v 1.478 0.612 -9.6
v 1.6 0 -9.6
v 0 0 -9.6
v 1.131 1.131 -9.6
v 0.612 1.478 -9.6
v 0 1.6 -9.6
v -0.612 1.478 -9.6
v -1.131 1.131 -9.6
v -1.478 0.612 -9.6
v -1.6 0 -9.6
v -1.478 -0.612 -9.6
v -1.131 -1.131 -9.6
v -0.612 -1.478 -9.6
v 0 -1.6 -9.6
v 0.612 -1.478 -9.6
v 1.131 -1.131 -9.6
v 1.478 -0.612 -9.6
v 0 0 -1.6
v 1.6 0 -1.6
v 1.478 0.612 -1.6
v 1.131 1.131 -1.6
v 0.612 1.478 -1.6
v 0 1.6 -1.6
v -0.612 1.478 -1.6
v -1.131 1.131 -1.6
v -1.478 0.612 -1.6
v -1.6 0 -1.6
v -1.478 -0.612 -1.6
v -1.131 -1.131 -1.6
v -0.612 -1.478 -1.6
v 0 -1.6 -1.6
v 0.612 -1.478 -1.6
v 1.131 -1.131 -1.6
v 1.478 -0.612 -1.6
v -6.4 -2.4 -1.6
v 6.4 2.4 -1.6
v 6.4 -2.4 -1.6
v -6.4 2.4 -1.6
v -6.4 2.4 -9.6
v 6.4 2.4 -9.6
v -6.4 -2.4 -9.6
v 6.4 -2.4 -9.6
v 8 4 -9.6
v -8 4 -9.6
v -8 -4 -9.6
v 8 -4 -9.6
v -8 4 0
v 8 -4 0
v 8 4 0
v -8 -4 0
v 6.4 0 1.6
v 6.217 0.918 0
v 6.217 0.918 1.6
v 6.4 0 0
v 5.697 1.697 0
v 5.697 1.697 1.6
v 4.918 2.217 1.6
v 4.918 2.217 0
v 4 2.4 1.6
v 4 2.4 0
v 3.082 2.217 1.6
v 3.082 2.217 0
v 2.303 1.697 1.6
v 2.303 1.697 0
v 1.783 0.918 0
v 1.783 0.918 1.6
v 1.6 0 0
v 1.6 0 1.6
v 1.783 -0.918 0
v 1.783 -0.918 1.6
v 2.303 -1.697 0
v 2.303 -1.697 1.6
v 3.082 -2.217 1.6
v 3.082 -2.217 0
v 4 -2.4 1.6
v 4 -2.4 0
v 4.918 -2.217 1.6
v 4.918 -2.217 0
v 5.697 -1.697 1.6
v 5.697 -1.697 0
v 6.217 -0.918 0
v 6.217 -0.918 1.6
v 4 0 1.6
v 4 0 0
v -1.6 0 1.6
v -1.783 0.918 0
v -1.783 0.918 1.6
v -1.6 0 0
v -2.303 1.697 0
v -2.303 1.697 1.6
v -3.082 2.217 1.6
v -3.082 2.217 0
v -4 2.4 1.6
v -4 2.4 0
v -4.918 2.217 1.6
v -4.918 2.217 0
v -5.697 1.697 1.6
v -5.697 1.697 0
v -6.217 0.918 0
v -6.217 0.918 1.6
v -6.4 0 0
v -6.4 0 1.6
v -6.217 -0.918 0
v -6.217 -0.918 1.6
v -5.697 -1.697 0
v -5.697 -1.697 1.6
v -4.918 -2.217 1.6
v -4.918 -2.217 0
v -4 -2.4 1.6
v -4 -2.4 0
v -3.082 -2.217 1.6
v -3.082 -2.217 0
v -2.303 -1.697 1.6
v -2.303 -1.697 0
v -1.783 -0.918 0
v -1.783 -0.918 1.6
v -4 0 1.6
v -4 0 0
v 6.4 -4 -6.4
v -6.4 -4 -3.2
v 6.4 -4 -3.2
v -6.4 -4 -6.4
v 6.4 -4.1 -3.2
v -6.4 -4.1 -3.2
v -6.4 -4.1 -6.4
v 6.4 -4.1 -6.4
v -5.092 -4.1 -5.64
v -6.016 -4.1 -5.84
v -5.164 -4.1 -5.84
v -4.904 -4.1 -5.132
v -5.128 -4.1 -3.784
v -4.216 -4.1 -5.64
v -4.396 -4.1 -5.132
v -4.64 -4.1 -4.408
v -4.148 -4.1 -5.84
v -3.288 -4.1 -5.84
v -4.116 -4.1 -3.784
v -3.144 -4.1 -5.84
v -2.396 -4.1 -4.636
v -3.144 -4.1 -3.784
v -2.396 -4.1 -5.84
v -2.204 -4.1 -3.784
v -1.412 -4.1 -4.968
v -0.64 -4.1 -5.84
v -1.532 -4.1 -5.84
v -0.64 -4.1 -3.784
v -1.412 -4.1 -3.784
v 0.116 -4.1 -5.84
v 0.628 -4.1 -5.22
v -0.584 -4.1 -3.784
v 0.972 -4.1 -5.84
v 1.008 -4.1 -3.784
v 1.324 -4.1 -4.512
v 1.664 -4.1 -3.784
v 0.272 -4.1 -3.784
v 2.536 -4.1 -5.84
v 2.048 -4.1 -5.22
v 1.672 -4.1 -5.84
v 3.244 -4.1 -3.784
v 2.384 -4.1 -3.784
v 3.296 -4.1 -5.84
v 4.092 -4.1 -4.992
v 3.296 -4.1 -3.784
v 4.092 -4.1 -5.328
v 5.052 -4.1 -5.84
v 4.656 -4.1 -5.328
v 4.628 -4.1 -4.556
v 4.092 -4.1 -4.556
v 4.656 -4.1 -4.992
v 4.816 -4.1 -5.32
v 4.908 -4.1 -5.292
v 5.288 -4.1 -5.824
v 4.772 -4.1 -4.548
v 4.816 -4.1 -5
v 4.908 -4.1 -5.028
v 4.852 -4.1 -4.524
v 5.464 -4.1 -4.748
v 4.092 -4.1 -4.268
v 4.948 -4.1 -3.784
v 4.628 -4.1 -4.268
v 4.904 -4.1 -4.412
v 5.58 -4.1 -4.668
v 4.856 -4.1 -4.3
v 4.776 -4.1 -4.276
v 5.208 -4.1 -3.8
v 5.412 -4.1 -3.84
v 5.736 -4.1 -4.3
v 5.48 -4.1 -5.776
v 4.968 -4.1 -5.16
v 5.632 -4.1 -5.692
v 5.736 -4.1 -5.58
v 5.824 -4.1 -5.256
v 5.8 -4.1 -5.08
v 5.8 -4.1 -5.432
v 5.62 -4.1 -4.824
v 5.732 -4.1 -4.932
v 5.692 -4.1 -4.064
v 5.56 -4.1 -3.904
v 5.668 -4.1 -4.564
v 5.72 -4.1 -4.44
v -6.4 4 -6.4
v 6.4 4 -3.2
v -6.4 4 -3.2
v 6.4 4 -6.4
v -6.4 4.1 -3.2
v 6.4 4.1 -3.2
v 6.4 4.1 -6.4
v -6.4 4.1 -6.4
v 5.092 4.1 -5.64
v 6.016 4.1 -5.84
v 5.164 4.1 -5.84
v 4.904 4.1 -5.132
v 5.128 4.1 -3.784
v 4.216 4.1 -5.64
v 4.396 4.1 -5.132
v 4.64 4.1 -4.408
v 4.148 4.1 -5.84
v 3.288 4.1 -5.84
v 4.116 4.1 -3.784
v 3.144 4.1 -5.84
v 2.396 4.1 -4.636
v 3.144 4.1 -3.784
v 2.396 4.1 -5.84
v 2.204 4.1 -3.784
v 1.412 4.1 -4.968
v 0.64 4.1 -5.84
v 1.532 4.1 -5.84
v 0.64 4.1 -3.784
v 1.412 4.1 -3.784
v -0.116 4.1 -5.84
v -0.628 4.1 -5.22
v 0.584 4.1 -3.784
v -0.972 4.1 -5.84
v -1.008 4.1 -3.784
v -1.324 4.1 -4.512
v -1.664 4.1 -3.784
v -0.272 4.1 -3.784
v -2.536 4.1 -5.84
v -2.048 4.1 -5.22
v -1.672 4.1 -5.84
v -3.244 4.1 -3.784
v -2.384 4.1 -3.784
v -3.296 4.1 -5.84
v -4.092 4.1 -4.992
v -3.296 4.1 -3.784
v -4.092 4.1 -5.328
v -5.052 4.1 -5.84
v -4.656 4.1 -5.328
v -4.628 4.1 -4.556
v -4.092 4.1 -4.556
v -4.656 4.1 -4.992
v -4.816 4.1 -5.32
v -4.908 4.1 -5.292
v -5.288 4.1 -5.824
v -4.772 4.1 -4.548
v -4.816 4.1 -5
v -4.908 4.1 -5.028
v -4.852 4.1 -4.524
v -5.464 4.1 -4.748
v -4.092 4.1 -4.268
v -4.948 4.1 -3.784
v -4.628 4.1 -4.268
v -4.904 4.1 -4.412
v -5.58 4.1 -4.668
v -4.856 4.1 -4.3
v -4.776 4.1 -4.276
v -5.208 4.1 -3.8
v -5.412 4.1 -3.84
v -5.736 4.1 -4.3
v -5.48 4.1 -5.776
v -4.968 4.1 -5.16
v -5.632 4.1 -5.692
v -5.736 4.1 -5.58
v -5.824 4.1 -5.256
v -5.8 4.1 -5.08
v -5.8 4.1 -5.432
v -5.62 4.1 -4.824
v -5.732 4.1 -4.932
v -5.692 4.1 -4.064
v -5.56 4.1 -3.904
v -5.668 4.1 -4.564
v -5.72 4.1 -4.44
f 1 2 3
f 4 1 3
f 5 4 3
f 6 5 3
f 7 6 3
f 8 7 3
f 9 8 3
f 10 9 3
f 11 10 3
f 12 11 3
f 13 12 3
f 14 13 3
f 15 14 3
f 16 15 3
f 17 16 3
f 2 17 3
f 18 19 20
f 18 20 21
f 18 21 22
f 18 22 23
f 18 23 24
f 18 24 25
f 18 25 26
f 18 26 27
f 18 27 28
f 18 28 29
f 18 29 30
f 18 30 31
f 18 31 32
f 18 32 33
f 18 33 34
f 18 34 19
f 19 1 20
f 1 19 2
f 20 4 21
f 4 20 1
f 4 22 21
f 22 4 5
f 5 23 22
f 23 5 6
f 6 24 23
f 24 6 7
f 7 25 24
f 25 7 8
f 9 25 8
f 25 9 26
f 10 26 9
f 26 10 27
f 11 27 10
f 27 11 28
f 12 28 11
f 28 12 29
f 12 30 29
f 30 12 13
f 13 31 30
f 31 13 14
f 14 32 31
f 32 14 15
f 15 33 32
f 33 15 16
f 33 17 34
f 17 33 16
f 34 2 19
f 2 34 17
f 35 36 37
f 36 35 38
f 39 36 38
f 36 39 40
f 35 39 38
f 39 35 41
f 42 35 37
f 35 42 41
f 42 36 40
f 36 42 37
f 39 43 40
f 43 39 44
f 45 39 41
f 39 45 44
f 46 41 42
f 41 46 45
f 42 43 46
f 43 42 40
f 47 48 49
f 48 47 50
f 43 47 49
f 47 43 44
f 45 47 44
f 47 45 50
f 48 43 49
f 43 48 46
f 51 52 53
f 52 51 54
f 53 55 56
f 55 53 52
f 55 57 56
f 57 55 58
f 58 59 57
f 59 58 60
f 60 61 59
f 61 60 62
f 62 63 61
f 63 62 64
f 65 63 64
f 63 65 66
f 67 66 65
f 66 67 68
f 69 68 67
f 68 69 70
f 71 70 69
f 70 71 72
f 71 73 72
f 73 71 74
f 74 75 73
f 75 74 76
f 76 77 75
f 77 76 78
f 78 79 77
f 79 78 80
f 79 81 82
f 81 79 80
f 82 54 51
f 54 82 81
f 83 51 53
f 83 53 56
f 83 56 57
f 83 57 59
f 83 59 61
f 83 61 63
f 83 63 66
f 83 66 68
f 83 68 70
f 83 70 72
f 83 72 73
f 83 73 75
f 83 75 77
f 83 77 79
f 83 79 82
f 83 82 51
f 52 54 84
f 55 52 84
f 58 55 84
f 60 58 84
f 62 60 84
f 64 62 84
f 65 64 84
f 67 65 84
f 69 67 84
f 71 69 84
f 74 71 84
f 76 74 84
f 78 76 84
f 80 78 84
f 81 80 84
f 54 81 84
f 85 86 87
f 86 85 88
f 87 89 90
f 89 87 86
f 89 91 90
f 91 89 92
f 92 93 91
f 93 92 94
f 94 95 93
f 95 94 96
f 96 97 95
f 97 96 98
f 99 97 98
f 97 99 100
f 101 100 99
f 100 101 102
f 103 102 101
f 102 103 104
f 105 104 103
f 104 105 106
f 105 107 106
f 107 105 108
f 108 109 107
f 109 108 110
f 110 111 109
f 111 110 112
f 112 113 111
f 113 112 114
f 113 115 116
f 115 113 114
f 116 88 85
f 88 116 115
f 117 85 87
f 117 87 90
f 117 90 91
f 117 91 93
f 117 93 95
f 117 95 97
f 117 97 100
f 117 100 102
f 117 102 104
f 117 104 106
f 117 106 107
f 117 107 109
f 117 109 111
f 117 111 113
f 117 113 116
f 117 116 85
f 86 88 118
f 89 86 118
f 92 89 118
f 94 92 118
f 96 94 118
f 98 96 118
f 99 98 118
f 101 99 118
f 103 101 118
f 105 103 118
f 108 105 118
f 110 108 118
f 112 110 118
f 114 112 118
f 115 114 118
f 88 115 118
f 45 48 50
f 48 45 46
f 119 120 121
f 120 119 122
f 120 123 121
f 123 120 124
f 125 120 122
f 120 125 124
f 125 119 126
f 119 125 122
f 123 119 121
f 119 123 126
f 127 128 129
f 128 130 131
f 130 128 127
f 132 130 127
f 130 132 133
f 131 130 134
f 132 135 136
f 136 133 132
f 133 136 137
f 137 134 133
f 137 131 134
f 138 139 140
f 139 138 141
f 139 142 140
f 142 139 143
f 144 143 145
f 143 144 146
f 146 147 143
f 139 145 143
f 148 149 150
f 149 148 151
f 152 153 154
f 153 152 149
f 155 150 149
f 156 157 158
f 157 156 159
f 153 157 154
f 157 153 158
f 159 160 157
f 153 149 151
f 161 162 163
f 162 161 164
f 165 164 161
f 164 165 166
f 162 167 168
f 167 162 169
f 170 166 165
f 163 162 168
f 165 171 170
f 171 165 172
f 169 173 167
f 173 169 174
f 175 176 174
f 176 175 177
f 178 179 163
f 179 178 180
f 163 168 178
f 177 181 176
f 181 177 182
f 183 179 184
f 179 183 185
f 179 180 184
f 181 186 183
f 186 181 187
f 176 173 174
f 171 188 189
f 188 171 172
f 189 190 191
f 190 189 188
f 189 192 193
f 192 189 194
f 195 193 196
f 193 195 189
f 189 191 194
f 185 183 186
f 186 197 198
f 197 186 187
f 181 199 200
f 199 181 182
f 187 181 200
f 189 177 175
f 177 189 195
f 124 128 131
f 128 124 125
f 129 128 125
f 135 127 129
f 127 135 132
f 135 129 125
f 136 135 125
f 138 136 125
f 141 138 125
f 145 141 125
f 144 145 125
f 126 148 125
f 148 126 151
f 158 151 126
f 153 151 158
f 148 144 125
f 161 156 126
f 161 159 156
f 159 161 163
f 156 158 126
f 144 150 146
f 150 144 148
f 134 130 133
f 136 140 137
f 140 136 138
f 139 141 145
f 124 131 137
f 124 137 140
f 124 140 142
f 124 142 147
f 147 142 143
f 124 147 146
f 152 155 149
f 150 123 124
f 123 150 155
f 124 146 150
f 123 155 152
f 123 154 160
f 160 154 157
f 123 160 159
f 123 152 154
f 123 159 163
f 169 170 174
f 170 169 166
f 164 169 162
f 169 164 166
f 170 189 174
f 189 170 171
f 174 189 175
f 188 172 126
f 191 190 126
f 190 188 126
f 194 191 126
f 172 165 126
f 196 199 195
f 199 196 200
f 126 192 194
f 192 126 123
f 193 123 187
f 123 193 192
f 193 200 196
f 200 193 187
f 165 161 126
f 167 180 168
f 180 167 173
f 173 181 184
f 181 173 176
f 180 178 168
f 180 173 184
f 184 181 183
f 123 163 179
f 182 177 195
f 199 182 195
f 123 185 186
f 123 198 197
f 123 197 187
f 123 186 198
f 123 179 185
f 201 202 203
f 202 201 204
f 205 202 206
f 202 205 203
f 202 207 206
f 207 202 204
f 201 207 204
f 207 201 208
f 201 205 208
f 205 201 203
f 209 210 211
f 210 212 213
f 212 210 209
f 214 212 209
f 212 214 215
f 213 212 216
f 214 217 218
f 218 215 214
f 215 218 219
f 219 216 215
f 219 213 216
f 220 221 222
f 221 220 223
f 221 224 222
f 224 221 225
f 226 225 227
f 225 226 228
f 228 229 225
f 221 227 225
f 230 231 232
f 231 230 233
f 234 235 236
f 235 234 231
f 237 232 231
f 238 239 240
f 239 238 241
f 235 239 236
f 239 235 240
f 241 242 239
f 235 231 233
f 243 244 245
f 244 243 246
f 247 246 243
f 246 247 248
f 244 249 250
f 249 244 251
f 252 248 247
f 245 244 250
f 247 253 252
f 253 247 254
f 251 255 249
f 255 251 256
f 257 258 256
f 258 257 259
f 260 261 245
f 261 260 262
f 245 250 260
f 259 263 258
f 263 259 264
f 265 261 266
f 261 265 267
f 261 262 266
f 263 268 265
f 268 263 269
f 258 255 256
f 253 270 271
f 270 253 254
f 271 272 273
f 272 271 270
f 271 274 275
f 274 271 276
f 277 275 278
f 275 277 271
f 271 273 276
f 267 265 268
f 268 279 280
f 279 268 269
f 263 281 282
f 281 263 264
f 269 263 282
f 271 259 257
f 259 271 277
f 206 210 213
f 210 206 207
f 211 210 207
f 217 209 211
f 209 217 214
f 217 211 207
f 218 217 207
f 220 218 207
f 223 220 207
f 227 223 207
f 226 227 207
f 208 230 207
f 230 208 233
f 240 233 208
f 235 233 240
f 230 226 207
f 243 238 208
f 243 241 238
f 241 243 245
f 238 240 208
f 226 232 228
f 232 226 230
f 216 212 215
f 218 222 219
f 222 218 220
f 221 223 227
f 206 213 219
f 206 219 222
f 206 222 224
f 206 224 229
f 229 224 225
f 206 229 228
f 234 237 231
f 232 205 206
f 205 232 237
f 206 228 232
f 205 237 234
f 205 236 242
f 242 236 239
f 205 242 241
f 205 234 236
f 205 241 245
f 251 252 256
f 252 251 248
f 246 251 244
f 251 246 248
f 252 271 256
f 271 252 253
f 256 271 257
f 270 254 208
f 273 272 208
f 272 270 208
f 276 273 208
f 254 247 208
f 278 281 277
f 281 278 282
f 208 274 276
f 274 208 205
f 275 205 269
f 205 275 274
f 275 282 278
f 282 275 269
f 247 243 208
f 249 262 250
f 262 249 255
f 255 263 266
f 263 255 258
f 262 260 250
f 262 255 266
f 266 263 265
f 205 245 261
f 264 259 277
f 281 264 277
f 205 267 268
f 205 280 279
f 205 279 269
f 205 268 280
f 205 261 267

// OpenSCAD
// file: ../p/4-4edge.scad
use <../lib.scad>
function ldraw_lib__4_4edge() = [
// 0 Circle 1.0
// 0 Name: 4-4edge.dat
// 0 Author: James Jessiman
// 0 !LDRAW_ORG Primitive UPDATE 2017-01
// 0 !LICENSE Licensed under CC BY 2.0 and CC BY 4.0 : see CAreadme.txt
// 
// 0 BFC CERTIFY CCW
  [0,"BFC","CERTIFY"],
  [0,"BFC","CCW"],
// 
// 0 !HISTORY 1998-12-15 [PTadmin] Official Update 1998-10
// 0 !HISTORY 2005-12-28 [PTadmin] Official Update 2005-01
// 0 !HISTORY 2007-06-24 [PTadmin] Header formatted for Contributor Agreement
// 0 !HISTORY 2008-07-01 [PTadmin] Official Update 2008-01
// 0 !HISTORY 2017-01-15 [Steffen] BFCed
// 0 !HISTORY 2017-12-30 [PTadmin] Official Update 2017-01
// 
// 
// 2 24 1 0 0 0.9239 0 0.3827
  [2,24,1,0,0,0.9239,0,0.3827],
// 2 24 0.9239 0 0.3827 0.7071 0 0.7071
  [2,24,0.9239,0,0.3827,0.7071,0,0.7071],
// 2 24 0.7071 0 0.7071 0.3827 0 0.9239
  [2,24,0.7071,0,0.7071,0.3827,0,0.9239],
// 2 24 0.3827 0 0.9239 0 0 1
  [2,24,0.3827,0,0.9239,0,0,1],
// 2 24 0 0 1 -0.3827 0 0.9239
  [2,24,0,0,1,-0.3827,0,0.9239],
// 2 24 -0.3827 0 0.9239 -0.7071 0 0.7071
  [2,24,-0.3827,0,0.9239,-0.7071,0,0.7071],
// 2 24 -0.7071 0 0.7071 -0.9239 0 0.3827
  [2,24,-0.7071,0,0.7071,-0.9239,0,0.3827],
// 2 24 -0.9239 0 0.3827 -1 0 -0
  [2,24,-0.9239,0,0.3827,-1,0,-0],
// 2 24 -1 0 -0 -0.9239 0 -0.3827
  [2,24,-1,0,-0,-0.9239,0,-0.3827],
// 2 24 -0.9239 0 -0.3827 -0.7071 0 -0.7071
  [2,24,-0.9239,0,-0.3827,-0.7071,0,-0.7071],
// 2 24 -0.7071 0 -0.7071 -0.3827 0 -0.9239
  [2,24,-0.7071,0,-0.7071,-0.3827,0,-0.9239],
// 2 24 -0.3827 0 -0.9239 0 0 -1
  [2,24,-0.3827,0,-0.9239,0,0,-1],
// 2 24 0 0 -1 0.3827 0 -0.9239
  [2,24,0,0,-1,0.3827,0,-0.9239],
// 2 24 0.3827 0 -0.9239 0.7071 0 -0.7071
  [2,24,0.3827,0,-0.9239,0.7071,0,-0.7071],
// 2 24 0.7071 0 -0.7071 0.9239 0 -0.3827
  [2,24,0.7071,0,-0.7071,0.9239,0,-0.3827],
// 2 24 0.9239 0 -0.3827 1 0 0
  [2,24,0.9239,0,-0.3827,1,0,0],
];
module ldraw_lib__4_4edge(step=0, col=false, unit=2/5, alt=false, line=0.2, solid=!$preview)
    makepoly(ldraw_lib__4_4edge(), step=step, col=col, unit=unit, alt=alt, line=line, solid=solid);
ldraw_lib__4_4edge(line=0.2);
// file: ../p/4-4disc.scad
use <../lib.scad>
function ldraw_lib__4_4disc() = [
// 0 Disc 1.0
// 0 Name: 4-4disc.dat
// 0 Author: James Jessiman
// 0 !LDRAW_ORG Primitive UPDATE 2002-02
// 0 !LICENSE Licensed under CC BY 2.0 and CC BY 4.0 : see CAreadme.txt
// 
// 0 BFC CERTIFY CCW
  [0,"BFC","CERTIFY"],
  [0,"BFC","CCW"],
// 
// 0 !HISTORY 1998-12-15 [PTadmin] Official Update 1998-10
// 0 !HISTORY 2002-03-23 [sbliss] Added BFC statement
// 0 !HISTORY 2002-04-25 [PTadmin] Official Update 2002-02
// 0 !HISTORY 2007-06-24 [PTadmin] Header formatted for Contributor Agreement
// 0 !HISTORY 2008-07-01 [PTadmin] Official Update 2008-01
// 
// 
// 3 16 0 0 0 1 0 0 0.9239 0 0.3827
  [3,16,0,0,0,1,0,0,0.9239,0,0.3827],
// 3 16 0 0 0 0.9239 0 0.3827 0.7071 0 0.7071
  [3,16,0,0,0,0.9239,0,0.3827,0.7071,0,0.7071],
// 3 16 0 0 0 0.7071 0 0.7071 0.3827 0 0.9239
  [3,16,0,0,0,0.7071,0,0.7071,0.3827,0,0.9239],
// 3 16 0 0 0 0.3827 0 0.9239 0 0 1
  [3,16,0,0,0,0.3827,0,0.9239,0,0,1],
// 3 16 0 0 0 0 0 1 -0.3827 0 0.9239
  [3,16,0,0,0,0,0,1,-0.3827,0,0.9239],
// 3 16 0 0 0 -0.3827 0 0.9239 -0.7071 0 0.7071
  [3,16,0,0,0,-0.3827,0,0.9239,-0.7071,0,0.7071],
// 3 16 0 0 0 -0.7071 0 0.7071 -0.9239 0 0.3827
  [3,16,0,0,0,-0.7071,0,0.7071,-0.9239,0,0.3827],
// 3 16 0 0 0 -0.9239 0 0.3827 -1 0 -0
  [3,16,0,0,0,-0.9239,0,0.3827,-1,0,-0],
// 3 16 0 0 0 -1 0 -0 -0.9239 0 -0.3827
  [3,16,0,0,0,-1,0,-0,-0.9239,0,-0.3827],
// 3 16 0 0 0 -0.9239 0 -0.3827 -0.7071 0 -0.7071
  [3,16,0,0,0,-0.9239,0,-0.3827,-0.7071,0,-0.7071],
// 3 16 0 0 0 -0.7071 0 -0.7071 -0.3827 0 -0.9239
  [3,16,0,0,0,-0.7071,0,-0.7071,-0.3827,0,-0.9239],
// 3 16 0 0 0 -0.3827 0 -0.9239 0 0 -1
  [3,16,0,0,0,-0.3827,0,-0.9239,0,0,-1],
// 3 16 0 0 0 0 0 -1 0.3827 0 -0.9239
  [3,16,0,0,0,0,0,-1,0.3827,0,-0.9239],
// 3 16 0 0 0 0.3827 0 -0.9239 0.7071 0 -0.7071
  [3,16,0,0,0,0.3827,0,-0.9239,0.7071,0,-0.7071],
// 3 16 0 0 0 0.7071 0 -0.7071 0.9239 0 -0.3827
  [3,16,0,0,0,0.7071,0,-0.7071,0.9239,0,-0.3827],
// 3 16 0 0 0 0.9239 0 -0.3827 1 0 0
  [3,16,0,0,0,0.9239,0,-0.3827,1,0,0],
// 0
];
module ldraw_lib__4_4disc(step=0, col=false, unit=2/5, alt=false, line=0.2, solid=!$preview)
    makepoly(ldraw_lib__4_4disc(), step=step, col=col, unit=unit, alt=alt, line=line, solid=solid);
ldraw_lib__4_4disc(line=0.2);
// file: ../p/4-4cyli.scad
use <../lib.scad>
$fa=1; $fs=0.2;
function ldraw_lib__4_4cyli(realsolid=false) = [
// 0 Cylinder 1.0
// 0 Name: 4-4cyli.dat
// 0 Author: James Jessiman
// 0 !LDRAW_ORG Primitive UPDATE 2005-01
// 0 !LICENSE Licensed under CC BY 2.0 and CC BY 4.0 : see CAreadme.txt
// 
// 0 BFC CERTIFY CCW
  [0,"BFC","CERTIFY"],
  [0,"BFC","CCW"],
// 
// 0 !HISTORY 1998-12-15 [PTadmin] Official Update 1998-10
// 0 !HISTORY 2002-03-23 [sbliss] Added BFC statement; merged headers from files in distributions LDraw 0.27 and Complete.
// 0 !HISTORY 2002-04-25 [PTadmin] Official Update 2002-02
// 0 !HISTORY 2004-12-14 [guyvivan] BFC CCW
// 0 !HISTORY 2005-12-28 [PTadmin] Official Update 2005-01
// 0 !HISTORY 2007-06-24 [PTadmin] Header formatted for Contributor Agreement
// 0 !HISTORY 2008-07-01 [PTadmin] Official Update 2008-01
// 
// 
// 4 16 1 1 0 0.9239 1 0.3827 0.9239 0 0.3827 1 0 0
  [4,16,1,1,0,0.9239,1,0.3827,0.9239,0,0.3827,1,0,0],
// 5 24 1 0 0 1 1 0 0.9239 0 0.3827 0.9239 0 -0.3827
  [5,24,1,0,0,1,1,0,0.9239,0,0.3827,0.9239,0,-0.3827],
// 4 16 0.9239 1 0.3827 0.7071 1 0.7071 0.7071 0 0.7071 0.9239 0 0.3827
  [4,16,0.9239,1,0.3827,0.7071,1,0.7071,0.7071,0,0.7071,0.9239,0,0.3827],
// 5 24 0.9239 0 0.3827 0.9239 1 0.3827 0.7071 0 0.7071 1 0 0
  [5,24,0.9239,0,0.3827,0.9239,1,0.3827,0.7071,0,0.7071,1,0,0],
// 4 16 0.7071 1 0.7071 0.3827 1 0.9239 0.3827 0 0.9239 0.7071 0 0.7071
  [4,16,0.7071,1,0.7071,0.3827,1,0.9239,0.3827,0,0.9239,0.7071,0,0.7071],
// 5 24 0.7071 0 0.7071 0.7071 1 0.7071 0.3827 0 0.9239 0.9239 0 0.3827
  [5,24,0.7071,0,0.7071,0.7071,1,0.7071,0.3827,0,0.9239,0.9239,0,0.3827],
// 4 16 0.3827 1 0.9239 0 1 1 0 0 1 0.3827 0 0.9239
  [4,16,0.3827,1,0.9239,0,1,1,0,0,1,0.3827,0,0.9239],
// 5 24 0.3827 0 0.9239 0.3827 1 0.9239 0 0 1 0.7071 0 0.7071
  [5,24,0.3827,0,0.9239,0.3827,1,0.9239,0,0,1,0.7071,0,0.7071],
// 4 16 0 1 1 -0.3827 1 0.9239 -0.3827 0 0.9239 0 0 1
  [4,16,0,1,1,-0.3827,1,0.9239,-0.3827,0,0.9239,0,0,1],
// 5 24 0 0 1 0 1 1 -0.3827 0 0.9239 0.3827 0 0.9239
  [5,24,0,0,1,0,1,1,-0.3827,0,0.9239,0.3827,0,0.9239],
// 4 16 -0.3827 1 0.9239 -0.7071 1 0.7071 -0.7071 0 0.7071 -0.3827 0 0.9239
  [4,16,-0.3827,1,0.9239,-0.7071,1,0.7071,-0.7071,0,0.7071,-0.3827,0,0.9239],
// 5 24 -0.3827 0 0.9239 -0.3827 1 0.9239 -0.7071 0 0.7071 0 0 1
  [5,24,-0.3827,0,0.9239,-0.3827,1,0.9239,-0.7071,0,0.7071,0,0,1],
// 4 16 -0.7071 1 0.7071 -0.9239 1 0.3827 -0.9239 0 0.3827 -0.7071 0 0.7071
  [4,16,-0.7071,1,0.7071,-0.9239,1,0.3827,-0.9239,0,0.3827,-0.7071,0,0.7071],
// 5 24 -0.7071 0 0.7071 -0.7071 1 0.7071 -0.9239 0 0.3827 -0.3827 0 0.9239
  [5,24,-0.7071,0,0.7071,-0.7071,1,0.7071,-0.9239,0,0.3827,-0.3827,0,0.9239],
// 4 16 -0.9239 1 0.3827 -1 1 0 -1 0 0 -0.9239 0 0.3827
  [4,16,-0.9239,1,0.3827,-1,1,0,-1,0,0,-0.9239,0,0.3827],
// 5 24 -0.9239 0 0.3827 -0.9239 1 0.3827 -1 0 0 -0.7071 0 0.7071
  [5,24,-0.9239,0,0.3827,-0.9239,1,0.3827,-1,0,0,-0.7071,0,0.7071],
// 4 16 -1 1 0 -0.9239 1 -0.3827 -0.9239 0 -0.3827 -1 0 0
  [4,16,-1,1,0,-0.9239,1,-0.3827,-0.9239,0,-0.3827,-1,0,0],
// 5 24 -1 0 0 -1 1 0 -0.9239 0 -0.3827 -0.9239 0 0.3827
  [5,24,-1,0,0,-1,1,0,-0.9239,0,-0.3827,-0.9239,0,0.3827],
// 4 16 -0.9239 1 -0.3827 -0.7071 1 -0.7071 -0.7071 0 -0.7071 -0.9239 0 -0.3827
  [4,16,-0.9239,1,-0.3827,-0.7071,1,-0.7071,-0.7071,0,-0.7071,-0.9239,0,-0.3827],
// 5 24 -0.9239 0 -0.3827 -0.9239 1 -0.3827 -0.7071 0 -0.7071 -1 0 0
  [5,24,-0.9239,0,-0.3827,-0.9239,1,-0.3827,-0.7071,0,-0.7071,-1,0,0],
// 4 16 -0.7071 1 -0.7071 -0.3827 1 -0.9239 -0.3827 0 -0.9239 -0.7071 0 -0.7071
  [4,16,-0.7071,1,-0.7071,-0.3827,1,-0.9239,-0.3827,0,-0.9239,-0.7071,0,-0.7071],
// 5 24 -0.7071 0 -0.7071 -0.7071 1 -0.7071 -0.3827 0 -0.9239 -0.9239 0 -0.3827
  [5,24,-0.7071,0,-0.7071,-0.7071,1,-0.7071,-0.3827,0,-0.9239,-0.9239,0,-0.3827],
// 4 16 -0.3827 1 -0.9239 0 1 -1 0 0 -1 -0.3827 0 -0.9239
  [4,16,-0.3827,1,-0.9239,0,1,-1,0,0,-1,-0.3827,0,-0.9239],
// 5 24 -0.3827 0 -0.9239 -0.3827 1 -0.9239 0 0 -1 -0.7071 0 -0.7071
  [5,24,-0.3827,0,-0.9239,-0.3827,1,-0.9239,0,0,-1,-0.7071,0,-0.7071],
// 4 16 0 1 -1 0.3827 1 -0.9239 0.3827 0 -0.9239 0 0 -1
  [4,16,0,1,-1,0.3827,1,-0.9239,0.3827,0,-0.9239,0,0,-1],
// 5 24 0 0 -1 0 1 -1 0.3827 0 -0.9239 -0.3827 0 -0.9239
  [5,24,0,0,-1,0,1,-1,0.3827,0,-0.9239,-0.3827,0,-0.9239],
// 4 16 0.3827 1 -0.9239 0.7071 1 -0.7071 0.7071 0 -0.7071 0.3827 0 -0.9239
  [4,16,0.3827,1,-0.9239,0.7071,1,-0.7071,0.7071,0,-0.7071,0.3827,0,-0.9239],
// 5 24 0.3827 0 -0.9239 0.3827 1 -0.9239 0.7071 0 -0.7071 0 0 -1
  [5,24,0.3827,0,-0.9239,0.3827,1,-0.9239,0.7071,0,-0.7071,0,0,-1],
// 4 16 0.7071 1 -0.7071 0.9239 1 -0.3827 0.9239 0 -0.3827 0.7071 0 -0.7071
  [4,16,0.7071,1,-0.7071,0.9239,1,-0.3827,0.9239,0,-0.3827,0.7071,0,-0.7071],
// 5 24 0.7071 0 -0.7071 0.7071 1 -0.7071 0.9239 0 -0.3827 0.3827 0 -0.9239
  [5,24,0.7071,0,-0.7071,0.7071,1,-0.7071,0.9239,0,-0.3827,0.3827,0,-0.9239],
// 4 16 0.9239 1 -0.3827 1 1 0 1 0 0 0.9239 0 -0.3827
  [4,16,0.9239,1,-0.3827,1,1,0,1,0,0,0.9239,0,-0.3827],
// 5 24 0.9239 0 -0.3827 0.9239 1 -0.3827 1 0 0 0.7071 0 -0.7071
  [5,24,0.9239,0,-0.3827,0.9239,1,-0.3827,1,0,0,0.7071,0,-0.7071],
// 0
];
module ldraw_lib__4_4cyli(step=0, col=false, unit=2/5, alt=false, line=0.2, solid=!$preview)
    makepoly(ldraw_lib__4_4cyli(solid), step=step, col=col, unit=unit, alt=alt, line=line, solid=solid);
ldraw_lib__4_4cyli(line=0.2);
// file: ../p/stud3.scad
use <../lib.scad>
use <4-4cyli.scad>
use <4-4disc.scad>
use <4-4edge.scad>
function ldraw_lib__stud3() = [
// 0 Stud Tube Solid
// 0 Name: stud3.dat
// 0 Author: James Jessiman
// 0 !LDRAW_ORG Primitive UPDATE 2012-01
// 0 !LICENSE Licensed under CC BY 4.0 : see CAreadme.txt
// 
// 0 BFC CERTIFY CCW
  [0,"BFC","CERTIFY"],
  [0,"BFC","CCW"],
// 
// 0 !HISTORY 2002-04-04 [sbliss] Modified for BFC compliance
// 0 !HISTORY 2002-04-25 [PTadmin] Official Update 2002-02
// 0 !HISTORY 2007-06-24 [PTadmin] Header formatted for Contributor Agreement
// 0 !HISTORY 2008-07-01 [PTadmin] Official Update 2008-01
// 0 !HISTORY 2012-02-16 [Philo] Changed to CCW
// 0 !HISTORY 2012-03-30 [PTadmin] Official Update 2012-01
// 
// 
// 1 16 0 -4 0 4 0 0 0 1 0 0 0 4 4-4edge.dat
  [1,16,0,-4,0,4,0,0,0,1,0,0,0,4, ldraw_lib__4_4edge()],
// 1 16 0 0 0 4 0 0 0 1 0 0 0 4 4-4edge.dat
  [1,16,0,0,0,4,0,0,0,1,0,0,0,4, ldraw_lib__4_4edge()],
// 1 16 0 -4 0 4 0 0 0 1 0 0 0 4 4-4disc.dat
  [1,16,0,-4,0,4,0,0,0,1,0,0,0,4, ldraw_lib__4_4disc()],
  [-1,16,0,0,0,4,0,0,0,-1,0,0,0,4, ldraw_lib__4_4disc()],
// 1 16 0 -4 0 4 0 0 0 4 0 0 0 4 4-4cyli.dat
  [1,16,0,-4,0,4,0,0,0,4,0,0,0,4, ldraw_lib__4_4cyli()],
];
module ldraw_lib__stud3(step=0, col=false, unit=2/5, alt=false, line=0.2, solid=!$preview)
    makepoly(ldraw_lib__stud3(), step=step, col=col, unit=unit, alt=alt, line=line, solid=solid);
ldraw_lib__stud3(line=0.2);
// file: ../p/stud.scad
use <../lib.scad>
use <4-4cyli.scad>
use <4-4disc.scad>
use <4-4edge.scad>
function ldraw_lib__stud() = [
// 0 Stud
// 0 Name: stud.dat
// 0 Author: James Jessiman
// 0 !LDRAW_ORG Primitive UPDATE 2012-01
// 0 !LICENSE Licensed under CC BY 4.0 : see CAreadme.txt
// 
// 0 BFC CERTIFY CCW
  [0,"BFC","CERTIFY"],
  [0,"BFC","CCW"],
// 
// 0 !HISTORY 2002-04-04 [sbliss] Modified for BFC compliance
// 0 !HISTORY 2002-04-25 [PTadmin] Official Update 2002-02
// 0 !HISTORY 2007-06-24 [PTadmin] Header formatted for Contributor Agreement
// 0 !HISTORY 2008-07-01 [PTadmin] Official Update 2008-01
// 0 !HISTORY 2012-02-16 [Philo] Changed to CCW
// 0 !HISTORY 2012-03-30 [PTadmin] Official Update 2012-01
// 
// 
// 1 16 0 0 0 6 0 0 0 1 0 0 0 6 4-4edge.dat
  [1,16,0,0,0,6,0,0,0,1,0,0,0,6, ldraw_lib__4_4edge()],
// 1 16 0 -4 0 6 0 0 0 1 0 0 0 6 4-4edge.dat
  [1,16,0,-4,0,6,0,0,0,1,0,0,0,6, ldraw_lib__4_4edge()],
// 1 16 0 0 0 6 0 0 0 -4 0 0 0 6 4-4cyli.dat
  [1,16,0,0,0,6,0,0,0,-4,0,0,0,6, ldraw_lib__4_4cyli()],
// 1 16 0 -4 0 6 0 0 0 1 0 0 0 6 4-4disc.dat
  [1,16,0,-4,0,6,0,0,0,1,0,0,0,6, ldraw_lib__4_4disc()],
  [-1,16,0,0,0,6,0,0,0,-1,0,0,0,6, ldraw_lib__4_4disc()],
];
module ldraw_lib__stud(step=0, col=false, unit=2/5, alt=false, line=0.2, solid=!$preview)
    makepoly(ldraw_lib__stud(), step=step, col=col, unit=unit, alt=alt, line=line, solid=solid);
ldraw_lib__stud(line=0.2);
// file: ../p/box5.scad
use <../lib.scad>
function ldraw_lib__box5() = [
// 0 Box with 5 Faces and All Edges
// 0 Name: box5.dat
// 0 Author: James Jessiman
// 0 !LDRAW_ORG Primitive UPDATE 2012-01
// 0 !LICENSE Licensed under CC BY 2.0 and CC BY 4.0 : see CAreadme.txt
// 
// 0 BFC CERTIFY CCW
  [0,"BFC","CERTIFY"],
  [0,"BFC","CCW"],
// 
// 0 !HISTORY 2002-04-03 [sbliss] Modified for BFC compliance
// 0 !HISTORY 2002-04-25 [PTadmin] Official Update 2002-02
// 0 !HISTORY 2007-06-24 [PTadmin] Header formatted for Contributor Agreement
// 0 !HISTORY 2008-07-01 [PTadmin] Official Update 2008-01
// 0 !HISTORY 2012-02-16 [Philo] Changed to CCW
// 0 !HISTORY 2012-03-30 [PTadmin] Official Update 2012-01
// 
// 
// 2 24 1 1 1 -1 1 1
  [2,24,1,1,1,-1,1,1],
// 2 24 -1 1 1 -1 1 -1
  [2,24,-1,1,1,-1,1,-1],
// 2 24 -1 1 -1 1 1 -1
  [2,24,-1,1,-1,1,1,-1],
// 2 24 1 1 -1 1 1 1
  [2,24,1,1,-1,1,1,1],
// 2 24 1 0 1 -1 0 1
  [2,24,1,0,1,-1,0,1],
// 2 24 -1 0 1 -1 0 -1
  [2,24,-1,0,1,-1,0,-1],
// 2 24 -1 0 -1 1 0 -1
  [2,24,-1,0,-1,1,0,-1],
// 2 24 1 0 -1 1 0 1
  [2,24,1,0,-1,1,0,1],
// 2 24 1 0 1 1 1 1
  [2,24,1,0,1,1,1,1],
// 2 24 -1 0 1 -1 1 1
  [2,24,-1,0,1,-1,1,1],
// 2 24 1 0 -1 1 1 -1
  [2,24,1,0,-1,1,1,-1],
// 2 24 -1 0 -1 -1 1 -1
  [2,24,-1,0,-1,-1,1,-1],
// 4 16 -1 1 1 1 1 1 1 1 -1 -1 1 -1
  [4,16,-1,1,1,1,1,1,1,1,-1,-1,1,-1],
// 4 16 -1 1 1 -1 0 1 1 0 1 1 1 1
  [4,16,-1,1,1,-1,0,1,1,0,1,1,1,1],
// 4 16 -1 1 -1 -1 0 -1 -1 0 1 -1 1 1
  [4,16,-1,1,-1,-1,0,-1,-1,0,1,-1,1,1],
// 4 16 1 1 -1 1 0 -1 -1 0 -1 -1 1 -1
  [4,16,1,1,-1,1,0,-1,-1,0,-1,-1,1,-1],
// 4 16 1 1 1 1 0 1 1 0 -1 1 1 -1
  [4,16,1,1,1,1,0,1,1,0,-1,1,1,-1],
];
makepoly(ldraw_lib__box5(), line=0.2);
// file: ../p/box4t.scad
use <../lib.scad>
function ldraw_lib__box4t() = [
// 0 Box with 4 Adjacent Faces and All Edges
// 0 Name: box4t.dat
// 0 Author: Tore Eriksson [Tore_Eriksson]
// 0 !LDRAW_ORG Primitive UPDATE 2003-02
// 0 !LICENSE Licensed under CC BY 2.0 and CC BY 4.0 : see CAreadme.txt
// 
// 0 BFC CERTIFY CCW
  [0,"BFC","CERTIFY"],
  [0,"BFC","CCW"],
// 
// 0 !HISTORY 1997-09-29 [PTadmin] Official Update 1997-15
// 0 !HISTORY 2002-08-31 [izanette] Modified with WINDZ for BFC compliance
// 0 !HISTORY 2003-08-01 [PTadmin] Official Update 2003-02
// 0 !HISTORY 2007-06-24 [PTadmin] Header formatted for Contributor Agreement
// 0 !HISTORY 2008-07-01 [PTadmin] Official Update 2008-01
// 
// 
// 2 24 1 1 1 -1 1 1
  [2,24,1,1,1,-1,1,1],
// 2 24 -1 1 1 -1 1 -1
  [2,24,-1,1,1,-1,1,-1],
// 2 24 -1 1 -1 1 1 -1
  [2,24,-1,1,-1,1,1,-1],
// 2 24 1 1 -1 1 1 1
  [2,24,1,1,-1,1,1,1],
// 2 24 1 0 1 -1 0 1
  [2,24,1,0,1,-1,0,1],
// 2 24 -1 0 1 -1 0 -1
  [2,24,-1,0,1,-1,0,-1],
// 2 24 -1 0 -1 1 0 -1
  [2,24,-1,0,-1,1,0,-1],
// 2 24 1 0 -1 1 0 1
  [2,24,1,0,-1,1,0,1],
// 2 24 1 0 1 1 1 1
  [2,24,1,0,1,1,1,1],
// 2 24 -1 0 1 -1 1 1
  [2,24,-1,0,1,-1,1,1],
// 2 24 1 0 -1 1 1 -1
  [2,24,1,0,-1,1,1,-1],
// 2 24 -1 0 -1 -1 1 -1
  [2,24,-1,0,-1,-1,1,-1],
// 4 16 1 1 1 1 1 -1 -1 1 -1 -1 1 1
  [4,16,1,1,1,1,1,-1,-1,1,-1,-1,1,1],
// 4 16 1 1 1 -1 1 1 -1 0 1 1 0 1
  [4,16,1,1,1,-1,1,1,-1,0,1,1,0,1],
// 4 16 -1 1 1 -1 1 -1 -1 0 -1 -1 0 1
  [4,16,-1,1,1,-1,1,-1,-1,0,-1,-1,0,1],
// 0 4 16 -1 1 -1 -1 0 -1 1 0 -1 1 1 -1
// 4 16 1 1 -1 1 1 1 1 0 1 1 0 -1
  [4,16,1,1,-1,1,1,1,1,0,1,1,0,-1],
// 0
];
makepoly(ldraw_lib__box4t(), line=0.2);
// file: s/3004s01.scad
use <../../lib.scad>
use <../../p/box4t.scad>
use <../../p/box5.scad>
use <../../p/stud.scad>
use <../../p/stud3.scad>
$fa=1; $fs=0.2;
function ldraw_lib__s__3004s01(realsolid=false) = [
// 0 ~Brick  1 x  2 without Front Face
// 0 Name: s\3004s01.dat
// 0 Author: James Jessiman
// 0 !LDRAW_ORG Subpart UPDATE 2003-03
// 0 !LICENSE Licensed under CC BY 2.0 and CC BY 4.0 : see CAreadme.txt
// 
// 0 BFC CERTIFY CCW
  [0,"BFC","CERTIFY"],
  [0,"BFC","CCW"],
// 
// 0 !HISTORY 2003-09-07 [jriley] Subfiling, BFC
// 0 !HISTORY 2003-12-19 [PTadmin] Official Update 2003-03
// 0 !HISTORY 2007-08-29 [PTadmin] Header formatted for Contributor Agreement
// 0 !HISTORY 2008-07-01 [PTadmin] Official Update 2008-01
// 
// 
// 1 16 0 4 0 1 0 0 0 -5 0 0 0 1 stud3.dat
  [1,16,0,4,0,1,0,0,0,-5,0,0,0,1, ldraw_lib__stud3(realsolid)],
// 0 BFC INVERTNEXT
  [0,"BFC","INVERTNEXT"],
// 1 16 0 24 0 16 0 0 0 -20 0 0 0 6 box5.dat
  [1,16,0,24,0,16,0,0,0,-20,0,0,0,6, ldraw_lib__box5(realsolid)],
// 4 16 20 24 10 16 24 6 -16 24 6 -20 24 10
  [4,16,20,24,10,16,24,6,-16,24,6,-20,24,10],
// 4 16 -20 24 10 -16 24 6 -16 24 -6 -20 24 -10
  [4,16,-20,24,10,-16,24,6,-16,24,-6,-20,24,-10],
// 4 16 -20 24 -10 -16 24 -6 16 24 -6 20 24 -10
  [4,16,-20,24,-10,-16,24,-6,16,24,-6,20,24,-10],
// 4 16 20 24 -10 16 24 -6 16 24 6 20 24 10
  [4,16,20,24,-10,16,24,-6,16,24,6,20,24,10],
// 1 16 0 24 0 20 0 0 0 -24 0 0 0 10 box4t.dat
  [1,16,0,24,0,20,0,0,0,-24,0,0,0,10, ldraw_lib__box4t(realsolid)],
// 1 16 10 0 0 1 0 0 0 1 0 0 0 1 stud.dat
  [1,16,10,0,0,1,0,0,0,1,0,0,0,1, ldraw_lib__stud(realsolid)],
// 1 16 -10 0 0 1 0 0 0 1 0 0 0 1 stud.dat
  [1,16,-10,0,0,1,0,0,0,1,0,0,0,1, ldraw_lib__stud(realsolid)],
// 0
];
module ldraw_lib__s__3004s01(step=0, col=false, unit=2/5, alt=false, line=0.2, solid=!$preview)
    makepoly(ldraw_lib__s__3004s01(solid), step=step, col=col, unit=unit, alt=alt, line=line, solid=solid);
ldraw_lib__s__3004s01(line=0.2);
// file: ../p/box5-12.scad
use <../lib.scad>
function ldraw_lib__box5_12() = [
// 0 Box with 5 Faces without Any Edges
// 0 Name: box5-12.dat
// 0 Author: Chris Dee [cwdee]
// 0 !LDRAW_ORG Primitive UPDATE 2009-02
// 0 !LICENSE Licensed under CC BY 2.0 and CC BY 4.0 : see CAreadme.txt
// 
// 0 BFC CERTIFY CCW
  [0,"BFC","CERTIFY"],
  [0,"BFC","CCW"],
// 
// 0 !HISTORY 2009-09-03 [PTadmin] Official Update 2009-02
// 
// 
// 4 16 1 1 1 1 1 -1 -1 1 -1 -1 1 1
  [4,16,1,1,1,1,1,-1,-1,1,-1,-1,1,1],
// 4 16 -1 0 1 1 0 1 1 1 1 -1 1 1
  [4,16,-1,0,1,1,0,1,1,1,1,-1,1,1],
// 4 16 -1 0 -1 -1 0 1 -1 1 1 -1 1 -1
  [4,16,-1,0,-1,-1,0,1,-1,1,1,-1,1,-1],
// 4 16 1 0 -1 -1 0 -1 -1 1 -1 1 1 -1
  [4,16,1,0,-1,-1,0,-1,-1,1,-1,1,1,-1],
// 4 16 1 0 1 1 0 -1 1 1 -1 1 1 1
  [4,16,1,0,1,1,0,-1,1,1,-1,1,1,1],
// 0
];
module ldraw_lib__box5_12(step=0, col=false, unit=2/5, alt=false, line=0.2, solid=!$preview)
    makepoly(ldraw_lib__box5_12(), step=step, col=col, unit=unit, alt=alt, line=line, solid=solid);
ldraw_lib__box5_12(line=0.2);
// file: 3004.scad
use <../lib.scad>
use <s/3004s01.scad>
function ldraw_lib__3004() = [
// 0 Brick  1 x  2
// 0 Name: 3004.dat
// 0 Author: James Jessiman
// 0 !LDRAW_ORG Part UPDATE 2022-05
// 0 !LICENSE Licensed under CC BY 2.0 and CC BY 4.0 : see CAreadme.txt
// 
// 0 BFC CERTIFY CCW
  [0,"BFC","CERTIFY"],
  [0,"BFC","CCW"],
// 
// 0 !HISTORY 2001-10-26 [PTadmin] Official Update 2001-01
// 0 !HISTORY 2002-05-07 {unknown} BFC Certification
// 0 !HISTORY 2002-06-11 [PTadmin] Official Update 2002-03
// 0 !HISTORY 2007-05-07 [PTadmin] Header formatted for Contributor Agreement
// 0 !HISTORY 2008-07-01 [PTadmin] Official Update 2008-01
// 0 !HISTORY 2022-08-04 [MagFors] Using subfile
// 0 !HISTORY 2022-09-15 [PTadmin] Official Update 2022-05
// 
// 
// 1 16 0 0 0 1 0 0 0 1 0 0 0 1 s\3004s01.dat
  [1,16,0,0,0,1,0,0,0,1,0,0,0,1, ldraw_lib__s__3004s01()],
// 4 16 -20 24 -10 20 24 -10 20 0 -10 -20 0 -10
  [4,16,-20,24,-10,20,24,-10,20,0,-10,-20,0,-10],
];
module ldraw_lib__3004(step=0, col=false, unit=2/5, alt=false, line=0.2, solid=!$preview)
    makepoly(ldraw_lib__3004(), step=step, col=col, unit=unit, alt=alt, line=line, solid=solid);
ldraw_lib__3004(line=0.2);
// main file
use <../lib.scad>
use <194535a.scad>
use <3004.scad>
function ldraw_lib__3004d0n() = [
// 0 Brick  1 x  2 with "ANWB" Sticker on Both Sides
// 0 Name: 3004d0n.dat
// 0 Author: Takeshi Takahashi [RainbowDolphin]
// 0 !LDRAW_ORG Shortcut UPDATE 2024-07
// 0 !LICENSE Licensed under CC BY 4.0 : see CAreadme.txt
// 
// 0 BFC CERTIFY CCW
  [0,"BFC","CERTIFY"],
  [0,"BFC","CCW"],
// 
// 0 !CATEGORY Sticker Shortcut
// 0 !KEYWORDS Breakdown assistance, Bricklink 3004pb019, Set 1590-2
// 
// 0 !HISTORY 2024-08-26 [OrionP] Official Update 2024-07
// 
// 1 16 0 0 0 1 0 0 0 1 0 0 0 1 3004.dat
  [1,16,0,0,0,1,0,0,0,1,0,0,0,1, ldraw_lib__3004()],
// 1 16 0 12 -10 1 0 0 0 0 -1 0 1 0 194535a.dat
  [1,16,0,12,-10,1,0,0,0,0,-1,0,1,0, ldraw_lib__194535a()],
// 1 16 0 12 10 -1 0 0 0 0 -1 0 -1 0 194535a.dat
  [1,16,0,12,10,-1,0,0,0,0,-1,0,-1,0, ldraw_lib__194535a()],
];
module ldraw_lib__3004d0n(step=0, col=false, unit=2/5, alt=false, line=0.2, solid=!$preview)
    makepoly(ldraw_lib__3004d0n(), step=step, col=col, unit=unit, alt=alt, line=line, solid=solid);
ldraw_lib__3004d0n(line=0.2);
